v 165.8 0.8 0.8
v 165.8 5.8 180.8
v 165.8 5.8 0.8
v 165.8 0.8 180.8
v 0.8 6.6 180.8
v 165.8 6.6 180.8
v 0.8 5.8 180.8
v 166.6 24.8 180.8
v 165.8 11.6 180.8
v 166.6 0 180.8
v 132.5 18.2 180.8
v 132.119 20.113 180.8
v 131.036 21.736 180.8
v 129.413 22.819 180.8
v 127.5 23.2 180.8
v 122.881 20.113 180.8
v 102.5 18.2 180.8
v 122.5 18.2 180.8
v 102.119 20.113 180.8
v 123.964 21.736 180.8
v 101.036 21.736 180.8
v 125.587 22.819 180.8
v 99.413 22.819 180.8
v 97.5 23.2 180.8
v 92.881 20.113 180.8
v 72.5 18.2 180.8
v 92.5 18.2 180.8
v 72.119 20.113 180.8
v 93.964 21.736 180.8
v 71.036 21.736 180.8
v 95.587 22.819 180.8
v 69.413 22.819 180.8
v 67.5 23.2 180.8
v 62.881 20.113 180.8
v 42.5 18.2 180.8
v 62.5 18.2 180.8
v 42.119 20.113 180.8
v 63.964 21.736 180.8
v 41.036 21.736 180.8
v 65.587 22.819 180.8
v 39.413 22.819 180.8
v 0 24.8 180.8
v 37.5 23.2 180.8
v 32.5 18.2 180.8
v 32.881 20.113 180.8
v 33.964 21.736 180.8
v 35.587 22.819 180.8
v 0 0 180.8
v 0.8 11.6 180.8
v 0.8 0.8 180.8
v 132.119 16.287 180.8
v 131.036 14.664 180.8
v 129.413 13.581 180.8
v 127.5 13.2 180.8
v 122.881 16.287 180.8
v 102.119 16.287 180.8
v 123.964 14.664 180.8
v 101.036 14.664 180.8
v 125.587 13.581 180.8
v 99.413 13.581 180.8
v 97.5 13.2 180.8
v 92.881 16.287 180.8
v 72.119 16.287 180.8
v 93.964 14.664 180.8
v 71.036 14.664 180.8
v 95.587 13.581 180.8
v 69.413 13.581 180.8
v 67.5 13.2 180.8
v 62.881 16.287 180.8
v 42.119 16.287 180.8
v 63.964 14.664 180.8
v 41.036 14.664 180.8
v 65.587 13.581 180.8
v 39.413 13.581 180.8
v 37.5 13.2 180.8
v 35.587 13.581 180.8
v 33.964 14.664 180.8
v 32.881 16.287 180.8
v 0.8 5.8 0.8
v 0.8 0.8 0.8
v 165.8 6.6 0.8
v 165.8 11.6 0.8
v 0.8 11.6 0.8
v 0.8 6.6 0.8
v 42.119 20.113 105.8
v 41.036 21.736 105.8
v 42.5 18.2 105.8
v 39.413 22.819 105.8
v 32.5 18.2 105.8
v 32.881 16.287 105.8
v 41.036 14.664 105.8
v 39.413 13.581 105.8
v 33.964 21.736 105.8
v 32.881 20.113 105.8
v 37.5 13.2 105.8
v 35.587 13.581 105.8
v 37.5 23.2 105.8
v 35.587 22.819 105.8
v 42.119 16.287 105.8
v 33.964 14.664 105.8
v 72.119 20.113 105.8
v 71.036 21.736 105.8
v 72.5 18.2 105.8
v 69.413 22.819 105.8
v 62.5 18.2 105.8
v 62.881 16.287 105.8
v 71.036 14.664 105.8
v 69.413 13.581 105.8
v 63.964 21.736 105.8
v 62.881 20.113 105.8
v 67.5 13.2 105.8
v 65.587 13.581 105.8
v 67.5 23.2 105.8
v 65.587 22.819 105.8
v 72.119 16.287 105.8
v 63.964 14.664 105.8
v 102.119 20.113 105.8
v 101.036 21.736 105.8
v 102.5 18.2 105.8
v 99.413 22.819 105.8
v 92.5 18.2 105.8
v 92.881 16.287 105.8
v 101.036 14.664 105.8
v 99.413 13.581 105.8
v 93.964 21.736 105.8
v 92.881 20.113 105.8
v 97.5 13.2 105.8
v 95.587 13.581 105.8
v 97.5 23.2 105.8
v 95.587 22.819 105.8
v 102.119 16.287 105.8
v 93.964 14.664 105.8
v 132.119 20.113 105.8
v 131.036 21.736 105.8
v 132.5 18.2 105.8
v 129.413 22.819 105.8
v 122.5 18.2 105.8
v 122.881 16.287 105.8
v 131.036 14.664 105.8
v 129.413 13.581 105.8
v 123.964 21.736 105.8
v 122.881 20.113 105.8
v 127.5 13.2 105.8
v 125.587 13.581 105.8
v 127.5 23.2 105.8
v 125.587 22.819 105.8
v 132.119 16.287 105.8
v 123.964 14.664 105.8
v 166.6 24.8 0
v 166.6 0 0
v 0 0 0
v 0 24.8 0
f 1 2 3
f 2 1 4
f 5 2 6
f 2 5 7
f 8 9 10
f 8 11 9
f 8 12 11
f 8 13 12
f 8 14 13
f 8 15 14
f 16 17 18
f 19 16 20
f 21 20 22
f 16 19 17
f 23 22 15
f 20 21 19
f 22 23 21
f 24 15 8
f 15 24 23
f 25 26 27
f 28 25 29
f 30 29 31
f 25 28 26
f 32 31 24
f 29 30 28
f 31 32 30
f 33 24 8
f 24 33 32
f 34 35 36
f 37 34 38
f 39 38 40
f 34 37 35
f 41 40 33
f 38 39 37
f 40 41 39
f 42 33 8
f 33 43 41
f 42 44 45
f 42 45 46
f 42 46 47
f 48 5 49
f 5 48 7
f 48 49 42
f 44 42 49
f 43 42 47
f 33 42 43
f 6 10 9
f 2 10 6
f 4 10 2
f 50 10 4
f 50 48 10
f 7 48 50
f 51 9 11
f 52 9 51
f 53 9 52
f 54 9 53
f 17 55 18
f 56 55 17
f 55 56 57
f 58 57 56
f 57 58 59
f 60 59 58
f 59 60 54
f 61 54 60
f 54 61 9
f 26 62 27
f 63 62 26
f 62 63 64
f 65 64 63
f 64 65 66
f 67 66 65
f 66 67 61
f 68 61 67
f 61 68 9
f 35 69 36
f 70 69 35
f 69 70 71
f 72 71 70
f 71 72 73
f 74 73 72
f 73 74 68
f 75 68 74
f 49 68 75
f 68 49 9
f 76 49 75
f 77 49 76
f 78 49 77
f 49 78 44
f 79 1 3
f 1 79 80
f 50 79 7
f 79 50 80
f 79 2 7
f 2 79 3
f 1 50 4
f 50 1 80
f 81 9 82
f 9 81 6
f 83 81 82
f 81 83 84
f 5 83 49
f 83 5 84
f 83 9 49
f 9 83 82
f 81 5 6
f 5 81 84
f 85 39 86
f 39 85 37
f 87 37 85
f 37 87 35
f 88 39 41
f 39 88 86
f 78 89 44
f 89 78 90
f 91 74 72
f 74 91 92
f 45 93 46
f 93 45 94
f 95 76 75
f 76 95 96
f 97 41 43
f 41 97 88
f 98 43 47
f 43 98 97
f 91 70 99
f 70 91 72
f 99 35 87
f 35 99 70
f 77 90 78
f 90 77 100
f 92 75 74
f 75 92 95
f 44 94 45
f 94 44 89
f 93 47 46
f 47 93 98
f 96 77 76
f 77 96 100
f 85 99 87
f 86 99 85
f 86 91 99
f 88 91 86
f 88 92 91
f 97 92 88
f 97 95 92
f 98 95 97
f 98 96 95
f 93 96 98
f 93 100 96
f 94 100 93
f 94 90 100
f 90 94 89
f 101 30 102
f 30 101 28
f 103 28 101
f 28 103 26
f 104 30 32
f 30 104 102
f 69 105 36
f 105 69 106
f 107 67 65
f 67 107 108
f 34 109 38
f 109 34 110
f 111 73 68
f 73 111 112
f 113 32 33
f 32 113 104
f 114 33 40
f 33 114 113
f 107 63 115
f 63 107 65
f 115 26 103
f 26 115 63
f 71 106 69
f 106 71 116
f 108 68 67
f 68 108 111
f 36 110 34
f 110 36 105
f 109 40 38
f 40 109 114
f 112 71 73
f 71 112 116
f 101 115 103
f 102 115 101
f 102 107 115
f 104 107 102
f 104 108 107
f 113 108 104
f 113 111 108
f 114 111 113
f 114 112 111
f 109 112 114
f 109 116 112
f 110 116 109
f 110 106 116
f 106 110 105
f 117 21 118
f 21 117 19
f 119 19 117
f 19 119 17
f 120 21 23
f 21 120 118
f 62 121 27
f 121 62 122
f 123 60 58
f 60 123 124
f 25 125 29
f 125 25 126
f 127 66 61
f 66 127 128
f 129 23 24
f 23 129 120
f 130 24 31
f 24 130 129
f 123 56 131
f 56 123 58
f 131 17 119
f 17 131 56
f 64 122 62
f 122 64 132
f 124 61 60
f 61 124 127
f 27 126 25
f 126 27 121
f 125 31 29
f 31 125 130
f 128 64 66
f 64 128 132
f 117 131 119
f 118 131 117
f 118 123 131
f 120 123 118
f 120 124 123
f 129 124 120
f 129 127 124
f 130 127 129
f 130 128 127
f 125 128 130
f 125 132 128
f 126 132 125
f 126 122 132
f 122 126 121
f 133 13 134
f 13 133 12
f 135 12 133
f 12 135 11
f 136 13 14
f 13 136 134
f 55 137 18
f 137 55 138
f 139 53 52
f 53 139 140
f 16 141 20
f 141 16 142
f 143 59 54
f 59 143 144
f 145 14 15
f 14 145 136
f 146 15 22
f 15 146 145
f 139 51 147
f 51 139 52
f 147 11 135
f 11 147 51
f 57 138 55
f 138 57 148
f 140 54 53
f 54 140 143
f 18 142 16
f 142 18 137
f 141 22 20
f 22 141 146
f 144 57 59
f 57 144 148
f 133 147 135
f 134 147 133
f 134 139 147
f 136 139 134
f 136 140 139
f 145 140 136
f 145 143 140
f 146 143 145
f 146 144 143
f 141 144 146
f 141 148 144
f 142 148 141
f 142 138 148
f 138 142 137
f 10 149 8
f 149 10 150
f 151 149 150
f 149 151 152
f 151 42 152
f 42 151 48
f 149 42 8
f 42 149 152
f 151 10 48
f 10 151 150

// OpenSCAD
//0.4 Nozzle
//0.4 Layer

wall = 0.8;
width = 165;
depth = 5;
height = 180;
pencil = 10;
pencil_height = 75;
holders = 2;
pencil_holders = 4;
pencil_space = 20;

full_cube_depth = depth*holders+wall*(holders+1)+pencil+wall*3;
full_cube_width = width+wall*2;
full_cube_height = height+wall;

difference() {
    cube([full_cube_width, full_cube_depth, full_cube_height]);
    for (x = [0:holders-1]) {
        translate([wall, wall+(depth+wall)*x, wall])
            cube([width, depth, height]);
    }
    pencil_width = (pencil+pencil_space)*pencil_holders-pencil_space;
    pencil_offset = (width-pencil_width)/2+pencil/2;
    for (x = [0:pencil_holders-1]) {
        x_off = pencil_offset+(pencil_space+pencil)*x;
        y_off = wall*2+pencil/2+(depth+wall)*holders;
        z_off = wall+height-pencil_height;
        translate([x_off, y_off, z_off])
            cylinder(d=pencil, h=pencil_height);
    }
}
